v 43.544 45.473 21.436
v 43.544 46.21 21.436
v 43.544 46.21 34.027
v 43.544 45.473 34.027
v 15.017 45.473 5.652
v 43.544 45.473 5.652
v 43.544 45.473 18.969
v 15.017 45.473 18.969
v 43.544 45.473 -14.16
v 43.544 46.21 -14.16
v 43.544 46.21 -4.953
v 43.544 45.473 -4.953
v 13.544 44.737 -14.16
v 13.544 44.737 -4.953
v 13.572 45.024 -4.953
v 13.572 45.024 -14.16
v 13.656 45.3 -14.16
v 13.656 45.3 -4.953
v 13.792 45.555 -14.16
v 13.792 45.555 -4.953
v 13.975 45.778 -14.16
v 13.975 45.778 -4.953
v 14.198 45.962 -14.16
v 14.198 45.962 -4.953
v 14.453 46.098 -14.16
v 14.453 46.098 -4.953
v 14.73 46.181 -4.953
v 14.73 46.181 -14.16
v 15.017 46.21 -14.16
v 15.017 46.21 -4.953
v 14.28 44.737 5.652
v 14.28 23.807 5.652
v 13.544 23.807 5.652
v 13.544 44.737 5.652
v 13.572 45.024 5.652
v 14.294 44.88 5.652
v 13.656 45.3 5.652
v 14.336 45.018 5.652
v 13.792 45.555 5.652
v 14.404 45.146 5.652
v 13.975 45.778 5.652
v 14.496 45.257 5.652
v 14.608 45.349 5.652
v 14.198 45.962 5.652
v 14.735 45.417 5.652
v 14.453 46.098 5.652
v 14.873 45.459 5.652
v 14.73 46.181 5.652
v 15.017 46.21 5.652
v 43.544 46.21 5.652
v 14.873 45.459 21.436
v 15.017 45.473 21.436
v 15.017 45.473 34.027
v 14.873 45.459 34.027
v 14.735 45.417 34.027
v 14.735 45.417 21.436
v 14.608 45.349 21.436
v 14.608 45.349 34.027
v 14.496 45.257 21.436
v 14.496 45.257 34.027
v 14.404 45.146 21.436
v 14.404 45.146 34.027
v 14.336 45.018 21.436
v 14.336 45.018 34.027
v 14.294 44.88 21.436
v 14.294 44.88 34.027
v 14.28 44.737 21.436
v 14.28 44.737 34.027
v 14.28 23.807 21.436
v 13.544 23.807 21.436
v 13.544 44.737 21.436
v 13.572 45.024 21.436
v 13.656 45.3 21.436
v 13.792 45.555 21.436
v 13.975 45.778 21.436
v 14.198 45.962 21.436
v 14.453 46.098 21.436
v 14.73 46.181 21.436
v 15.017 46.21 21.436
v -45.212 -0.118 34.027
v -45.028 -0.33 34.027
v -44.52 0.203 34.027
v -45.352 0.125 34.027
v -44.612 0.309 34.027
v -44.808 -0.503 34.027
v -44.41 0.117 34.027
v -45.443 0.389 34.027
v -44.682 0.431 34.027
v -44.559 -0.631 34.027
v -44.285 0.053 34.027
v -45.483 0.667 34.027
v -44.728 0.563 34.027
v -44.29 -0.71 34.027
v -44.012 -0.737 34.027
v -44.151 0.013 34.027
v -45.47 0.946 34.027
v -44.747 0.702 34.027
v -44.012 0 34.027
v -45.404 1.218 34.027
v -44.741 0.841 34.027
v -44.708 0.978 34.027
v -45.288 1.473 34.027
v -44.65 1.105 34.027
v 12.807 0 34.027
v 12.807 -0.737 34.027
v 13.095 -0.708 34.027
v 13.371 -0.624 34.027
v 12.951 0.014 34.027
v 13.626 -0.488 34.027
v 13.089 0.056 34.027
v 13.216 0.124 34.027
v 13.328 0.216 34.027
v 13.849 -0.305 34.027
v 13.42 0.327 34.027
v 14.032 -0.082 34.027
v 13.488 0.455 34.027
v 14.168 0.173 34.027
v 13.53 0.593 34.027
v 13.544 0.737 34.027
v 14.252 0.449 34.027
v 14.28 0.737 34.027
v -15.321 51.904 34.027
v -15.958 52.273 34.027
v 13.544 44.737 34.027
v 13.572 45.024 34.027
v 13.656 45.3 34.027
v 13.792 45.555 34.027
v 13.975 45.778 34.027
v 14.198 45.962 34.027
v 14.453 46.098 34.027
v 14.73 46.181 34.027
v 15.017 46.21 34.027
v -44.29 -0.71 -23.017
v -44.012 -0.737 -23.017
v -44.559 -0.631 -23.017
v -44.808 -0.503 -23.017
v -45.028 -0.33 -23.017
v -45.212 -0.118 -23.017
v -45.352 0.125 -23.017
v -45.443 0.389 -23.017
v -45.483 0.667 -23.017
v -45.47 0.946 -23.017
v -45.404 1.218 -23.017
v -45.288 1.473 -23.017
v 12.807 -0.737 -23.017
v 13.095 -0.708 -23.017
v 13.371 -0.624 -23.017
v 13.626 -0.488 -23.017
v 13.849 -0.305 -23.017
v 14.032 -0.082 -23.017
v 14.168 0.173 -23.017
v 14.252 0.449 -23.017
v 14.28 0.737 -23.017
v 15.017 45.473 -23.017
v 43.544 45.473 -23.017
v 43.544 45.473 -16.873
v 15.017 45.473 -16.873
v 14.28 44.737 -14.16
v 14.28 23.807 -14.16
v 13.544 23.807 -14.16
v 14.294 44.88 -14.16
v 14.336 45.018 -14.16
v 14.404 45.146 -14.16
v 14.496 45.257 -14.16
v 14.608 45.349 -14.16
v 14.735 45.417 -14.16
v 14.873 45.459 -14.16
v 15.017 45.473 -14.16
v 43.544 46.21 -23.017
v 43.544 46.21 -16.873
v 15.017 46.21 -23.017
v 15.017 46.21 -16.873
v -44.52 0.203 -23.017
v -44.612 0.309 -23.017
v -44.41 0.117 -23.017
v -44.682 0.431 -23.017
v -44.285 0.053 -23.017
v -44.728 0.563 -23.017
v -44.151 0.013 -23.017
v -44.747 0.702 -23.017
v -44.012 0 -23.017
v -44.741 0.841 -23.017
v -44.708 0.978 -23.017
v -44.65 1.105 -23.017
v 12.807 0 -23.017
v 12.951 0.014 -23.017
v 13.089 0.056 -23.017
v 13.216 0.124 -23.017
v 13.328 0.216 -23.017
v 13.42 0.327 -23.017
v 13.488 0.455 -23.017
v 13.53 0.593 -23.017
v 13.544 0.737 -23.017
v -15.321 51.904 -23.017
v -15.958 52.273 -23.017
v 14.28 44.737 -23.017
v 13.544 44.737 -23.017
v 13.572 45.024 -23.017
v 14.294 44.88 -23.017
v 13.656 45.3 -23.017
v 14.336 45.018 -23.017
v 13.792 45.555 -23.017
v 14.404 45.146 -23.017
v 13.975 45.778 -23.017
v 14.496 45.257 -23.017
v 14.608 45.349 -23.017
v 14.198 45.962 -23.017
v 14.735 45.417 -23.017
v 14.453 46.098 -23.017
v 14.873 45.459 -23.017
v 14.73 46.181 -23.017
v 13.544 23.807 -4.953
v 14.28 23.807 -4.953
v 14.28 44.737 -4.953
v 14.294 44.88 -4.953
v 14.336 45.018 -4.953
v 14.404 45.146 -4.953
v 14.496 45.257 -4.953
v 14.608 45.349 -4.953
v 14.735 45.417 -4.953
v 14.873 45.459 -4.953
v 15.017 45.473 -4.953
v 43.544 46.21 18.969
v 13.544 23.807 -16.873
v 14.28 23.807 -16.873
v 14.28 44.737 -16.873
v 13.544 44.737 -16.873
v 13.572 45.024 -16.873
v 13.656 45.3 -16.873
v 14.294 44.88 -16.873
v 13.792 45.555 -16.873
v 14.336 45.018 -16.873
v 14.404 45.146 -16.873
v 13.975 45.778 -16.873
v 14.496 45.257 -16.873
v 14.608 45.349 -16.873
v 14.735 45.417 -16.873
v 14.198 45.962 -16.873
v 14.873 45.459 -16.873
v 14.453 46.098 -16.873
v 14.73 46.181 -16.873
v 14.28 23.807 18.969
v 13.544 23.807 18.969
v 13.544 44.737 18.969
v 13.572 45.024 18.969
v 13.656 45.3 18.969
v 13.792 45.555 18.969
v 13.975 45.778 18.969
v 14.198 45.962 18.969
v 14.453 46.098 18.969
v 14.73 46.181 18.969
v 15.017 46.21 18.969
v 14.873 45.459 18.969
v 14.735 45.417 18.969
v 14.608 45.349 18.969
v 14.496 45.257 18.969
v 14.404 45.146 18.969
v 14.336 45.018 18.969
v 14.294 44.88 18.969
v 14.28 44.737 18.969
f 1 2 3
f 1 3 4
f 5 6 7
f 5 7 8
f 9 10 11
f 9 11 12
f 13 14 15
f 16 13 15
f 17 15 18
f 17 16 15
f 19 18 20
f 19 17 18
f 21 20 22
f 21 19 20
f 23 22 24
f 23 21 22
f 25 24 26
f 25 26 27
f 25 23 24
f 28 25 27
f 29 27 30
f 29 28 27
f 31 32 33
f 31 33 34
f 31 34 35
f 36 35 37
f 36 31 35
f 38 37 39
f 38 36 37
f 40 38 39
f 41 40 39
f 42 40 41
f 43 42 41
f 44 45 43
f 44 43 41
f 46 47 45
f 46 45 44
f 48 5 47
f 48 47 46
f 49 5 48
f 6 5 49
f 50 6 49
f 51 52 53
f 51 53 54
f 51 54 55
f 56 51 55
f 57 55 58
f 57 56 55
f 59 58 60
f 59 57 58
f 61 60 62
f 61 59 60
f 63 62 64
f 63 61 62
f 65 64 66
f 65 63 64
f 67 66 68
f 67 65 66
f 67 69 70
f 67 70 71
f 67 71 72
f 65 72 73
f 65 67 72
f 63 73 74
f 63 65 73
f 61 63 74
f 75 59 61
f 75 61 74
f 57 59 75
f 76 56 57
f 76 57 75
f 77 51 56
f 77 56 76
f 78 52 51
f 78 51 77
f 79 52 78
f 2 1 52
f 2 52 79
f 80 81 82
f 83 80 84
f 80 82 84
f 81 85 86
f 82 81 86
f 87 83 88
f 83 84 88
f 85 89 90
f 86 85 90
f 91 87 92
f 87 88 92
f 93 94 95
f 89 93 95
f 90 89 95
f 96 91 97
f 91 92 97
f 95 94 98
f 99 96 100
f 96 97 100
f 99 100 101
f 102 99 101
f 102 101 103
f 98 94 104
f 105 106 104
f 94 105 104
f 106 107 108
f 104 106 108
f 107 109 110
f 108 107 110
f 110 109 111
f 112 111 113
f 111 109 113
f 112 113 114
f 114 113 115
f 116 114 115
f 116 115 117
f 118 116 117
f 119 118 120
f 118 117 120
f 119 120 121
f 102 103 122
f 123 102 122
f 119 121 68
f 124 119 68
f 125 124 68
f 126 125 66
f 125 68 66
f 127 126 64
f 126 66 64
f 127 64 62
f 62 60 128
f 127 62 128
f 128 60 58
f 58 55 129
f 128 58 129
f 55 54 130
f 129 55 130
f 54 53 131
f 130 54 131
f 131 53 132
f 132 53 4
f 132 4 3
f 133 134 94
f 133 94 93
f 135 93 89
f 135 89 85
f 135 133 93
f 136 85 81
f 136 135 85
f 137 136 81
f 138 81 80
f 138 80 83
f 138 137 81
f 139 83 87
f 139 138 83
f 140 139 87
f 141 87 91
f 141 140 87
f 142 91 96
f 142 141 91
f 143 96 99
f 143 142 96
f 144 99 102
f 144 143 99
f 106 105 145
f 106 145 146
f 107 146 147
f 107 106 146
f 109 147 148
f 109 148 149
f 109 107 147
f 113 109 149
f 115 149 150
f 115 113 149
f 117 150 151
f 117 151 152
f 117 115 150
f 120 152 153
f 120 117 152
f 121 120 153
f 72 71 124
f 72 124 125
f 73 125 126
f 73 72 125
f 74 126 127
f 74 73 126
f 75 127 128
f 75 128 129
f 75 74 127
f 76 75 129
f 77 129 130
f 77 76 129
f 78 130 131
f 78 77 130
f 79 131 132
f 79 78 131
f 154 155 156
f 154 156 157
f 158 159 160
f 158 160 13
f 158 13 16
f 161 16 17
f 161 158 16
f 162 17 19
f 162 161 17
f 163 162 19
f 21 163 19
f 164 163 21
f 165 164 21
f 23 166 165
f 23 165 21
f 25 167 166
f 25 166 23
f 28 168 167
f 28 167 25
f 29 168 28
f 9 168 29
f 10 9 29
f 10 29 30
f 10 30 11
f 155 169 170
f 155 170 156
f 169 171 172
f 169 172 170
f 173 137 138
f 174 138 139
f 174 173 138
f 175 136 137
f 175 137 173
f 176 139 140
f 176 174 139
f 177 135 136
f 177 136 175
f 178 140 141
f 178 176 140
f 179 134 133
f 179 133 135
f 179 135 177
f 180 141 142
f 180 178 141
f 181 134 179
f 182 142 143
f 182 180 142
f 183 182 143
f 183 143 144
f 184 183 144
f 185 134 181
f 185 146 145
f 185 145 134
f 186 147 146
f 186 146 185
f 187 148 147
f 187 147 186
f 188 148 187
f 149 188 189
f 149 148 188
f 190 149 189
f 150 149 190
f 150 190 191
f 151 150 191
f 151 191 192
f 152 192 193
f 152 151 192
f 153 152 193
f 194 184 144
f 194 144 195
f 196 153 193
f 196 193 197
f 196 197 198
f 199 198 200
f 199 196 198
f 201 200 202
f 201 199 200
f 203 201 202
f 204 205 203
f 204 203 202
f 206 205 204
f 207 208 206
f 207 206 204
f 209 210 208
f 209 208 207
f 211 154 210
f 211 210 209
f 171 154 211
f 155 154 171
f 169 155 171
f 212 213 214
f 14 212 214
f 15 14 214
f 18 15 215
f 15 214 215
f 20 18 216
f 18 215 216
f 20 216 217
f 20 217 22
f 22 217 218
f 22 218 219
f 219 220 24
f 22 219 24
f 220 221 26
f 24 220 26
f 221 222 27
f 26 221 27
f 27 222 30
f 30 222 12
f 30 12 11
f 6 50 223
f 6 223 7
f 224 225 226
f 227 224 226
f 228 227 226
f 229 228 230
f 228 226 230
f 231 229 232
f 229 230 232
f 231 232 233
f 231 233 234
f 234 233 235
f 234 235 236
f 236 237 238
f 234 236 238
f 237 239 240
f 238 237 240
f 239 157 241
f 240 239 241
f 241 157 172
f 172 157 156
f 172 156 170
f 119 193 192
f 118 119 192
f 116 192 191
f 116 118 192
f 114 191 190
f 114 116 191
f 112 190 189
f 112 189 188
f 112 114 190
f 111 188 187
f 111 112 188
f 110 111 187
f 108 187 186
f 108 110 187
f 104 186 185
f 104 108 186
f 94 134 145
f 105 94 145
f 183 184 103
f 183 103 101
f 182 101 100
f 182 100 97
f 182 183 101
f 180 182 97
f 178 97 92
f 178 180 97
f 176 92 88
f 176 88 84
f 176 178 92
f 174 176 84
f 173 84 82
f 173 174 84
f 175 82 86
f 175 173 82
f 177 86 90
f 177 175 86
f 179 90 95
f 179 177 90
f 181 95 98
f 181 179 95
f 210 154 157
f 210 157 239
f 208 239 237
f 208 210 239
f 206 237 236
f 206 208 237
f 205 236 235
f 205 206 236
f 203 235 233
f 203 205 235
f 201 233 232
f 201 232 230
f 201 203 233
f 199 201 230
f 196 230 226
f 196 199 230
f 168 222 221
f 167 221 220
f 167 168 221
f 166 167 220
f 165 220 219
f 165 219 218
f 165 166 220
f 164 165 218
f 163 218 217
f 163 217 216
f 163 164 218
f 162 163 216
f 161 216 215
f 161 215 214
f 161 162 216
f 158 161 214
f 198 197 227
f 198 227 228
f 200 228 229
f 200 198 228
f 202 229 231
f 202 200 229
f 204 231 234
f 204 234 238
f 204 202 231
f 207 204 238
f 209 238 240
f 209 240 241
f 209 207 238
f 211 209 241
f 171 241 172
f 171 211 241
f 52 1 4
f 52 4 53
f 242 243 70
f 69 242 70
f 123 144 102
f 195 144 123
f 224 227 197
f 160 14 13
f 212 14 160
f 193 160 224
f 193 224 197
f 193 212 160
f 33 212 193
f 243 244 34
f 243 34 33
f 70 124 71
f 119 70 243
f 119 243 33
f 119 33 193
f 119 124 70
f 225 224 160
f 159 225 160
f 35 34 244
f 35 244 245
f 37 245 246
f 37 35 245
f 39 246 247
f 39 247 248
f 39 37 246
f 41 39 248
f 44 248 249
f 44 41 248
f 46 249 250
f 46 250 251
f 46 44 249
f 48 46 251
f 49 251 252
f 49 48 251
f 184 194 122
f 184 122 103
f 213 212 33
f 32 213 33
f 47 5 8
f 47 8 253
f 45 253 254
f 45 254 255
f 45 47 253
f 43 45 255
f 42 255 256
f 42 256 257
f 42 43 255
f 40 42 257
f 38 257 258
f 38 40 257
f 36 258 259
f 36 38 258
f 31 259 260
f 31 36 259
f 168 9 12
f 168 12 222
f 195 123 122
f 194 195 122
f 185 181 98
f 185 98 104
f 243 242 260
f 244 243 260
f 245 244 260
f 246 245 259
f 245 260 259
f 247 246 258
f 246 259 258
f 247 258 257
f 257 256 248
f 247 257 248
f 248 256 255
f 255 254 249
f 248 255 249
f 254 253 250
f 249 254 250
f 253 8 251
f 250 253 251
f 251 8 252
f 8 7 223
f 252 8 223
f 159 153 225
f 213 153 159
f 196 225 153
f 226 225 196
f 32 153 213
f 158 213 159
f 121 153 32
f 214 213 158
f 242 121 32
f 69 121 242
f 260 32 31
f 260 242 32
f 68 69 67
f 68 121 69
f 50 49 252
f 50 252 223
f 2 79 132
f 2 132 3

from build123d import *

# Parameters (mm, degrees)
SKETCH1_W                      = 58.831256187
SKETCH1_H                      = 57.04415391
BASE_FLANGE1_DEPTH             = 0.7366
EDGE_FLANGE1_STRIP_W           = 4.4196
EDGE_FLANGE1_STRIP_H           = 0.7366
EDGE_FLANGE1_STRIP_CUT_DEPTH   = 57.044153909
EDGE_FLANGE1_DEPTH             = 57.044153909
SKETCH7_W                      = 2.712818276
SKETCH7_H                      = 25.730670316
SKETCH7_W_2                    = 10.604653262
SKETCH7_H_2                    = 26.641488396
SKETCH7_W_3                    = 2.466198433
SKETCH7_H_3                    = 28.772283842
CUT_EXTRUDE1_DEPTH             = 10
EDGE_FLANGE2_STRIP_CUT_DEPTH   = 57.044153909
EDGE_FLANGE2_DEPTH             = 57.044153909
EDGE_FLANGE3_STRIP_W           = 4.4196
EDGE_FLANGE3_STRIP_H           = 0.7366
EDGE_FLANGE3_STRIP_CUT_DEPTH   = 6.14423041
EDGE_FLANGE3_STRIP_2_W         = 4.4196
EDGE_FLANGE3_STRIP_2_H         = 0.7366
EDGE_FLANGE3_STRIP_CUT_2_DEPTH = 9.207140816
EDGE_FLANGE3_STRIP_3_W         = 4.4196
EDGE_FLANGE3_STRIP_3_H         = 0.7366
EDGE_FLANGE3_STRIP_CUT_3_DEPTH = 13.317471538
EDGE_FLANGE3_STRIP_4_W         = 4.4196
EDGE_FLANGE3_STRIP_4_H         = 0.7366
EDGE_FLANGE3_STRIP_CUT_4_DEPTH = 12.591641176
EDGE_FLANGE3_DEPTH             = 6.14423041
EDGE_FLANGE3_BEND_DEPTH        = 9.207140816
EDGE_FLANGE3_BEND_2_DEPTH      = 13.317471538
EDGE_FLANGE3_BEND_3_DEPTH      = 12.591641176


# Sheet-metal steps are written as plain solids
with BuildPart() as part:
    # Sketch1 → Base-Flange1 (new body)
    with BuildSketch(Plane(origin=(0, 0, 0), x_dir=(1, 0, 0), z_dir=(0, 1, 0))):
        with Locations((-15.871888874, -5.505069705)):
            Rectangle(SKETCH1_W, SKETCH1_H)
    extrude(amount=-BASE_FLANGE1_DEPTH)

    # Edge-Flange1 strip (across the edge) → Edge-Flange1 strip cut (cut)
    with BuildSketch(Plane(origin=(13.54373922, 0, 34.02714666), x_dir=(-1, 0, 0), z_dir=(0, 0, -1))):
        with Locations((-1.4732, -0.3683)):
            Rectangle(EDGE_FLANGE1_STRIP_W, EDGE_FLANGE1_STRIP_H)
    extrude(amount=EDGE_FLANGE1_STRIP_CUT_DEPTH, mode=Mode.SUBTRACT)

    # Edge-Flange1 section (across the edge) → Edge-Flange1 (add)
    with BuildSketch(Plane(origin=(13.54373922, 0, 34.02714666), x_dir=(-1, 0, 0), z_dir=(0, 0, -1))):
        with BuildLine():
            Line((-0.7366, 0.7366), (-0.7366, 45.4732))
            Line((-0.7366, 45.4732), (0, 45.4732))
            Line((0, 45.4732), (0, 0.7366))
            ThreePointArc((0, 0.7366), (0.215745145, 0.215745145), (0.7366, 0))
            Line((0.7366, 0), (0.7366, -0.7366))
            ThreePointArc((0.7366, -0.7366), (-0.30510971, -0.30510971), (-0.7366, 0.7366))
        make_face()
    extrude(amount=EDGE_FLANGE1_DEPTH)

    # Sketch7 → Cut-Extrude1 (cut)
    with BuildSketch(Plane.ZY.offset(-13.54373922)):
        with Locations((-15.516367702, 36.672250911)):
            Rectangle(SKETCH7_W, SKETCH7_H)
        with Locations((0.349508883, 37.127659951)):
            Rectangle(SKETCH7_W_2, SKETCH7_H_2)
        with Locations((20.202406268, 38.193057674)):
            Rectangle(SKETCH7_W_3, SKETCH7_H_3)
    extrude(amount=-CUT_EXTRUDE1_DEPTH, mode=Mode.SUBTRACT)

    # Edge-Flange2 strip (across the edge) → Edge-Flange2 strip cut (cut)
    with BuildSketch(Plane(origin=(-45.287516967, 0, -23.01700725), x_dir=(0.8660254037844398, -0.499999999999998, 0), z_dir=(0, 0, 1))):
        Polygon((-5.1562, -3.827485875), (1.4732, 0), (1.1049, 0.637914312), (-5.5245, -3.189571562), align=None)
    extrude(amount=EDGE_FLANGE2_STRIP_CUT_DEPTH, mode=Mode.SUBTRACT)

    # Edge-Flange2 section (across the edge) → Edge-Flange2 (add)
    with BuildSketch(Plane(origin=(-45.287516967, 0, -23.01700725), x_dir=(0.8660254037844398, -0.499999999999998, 0), z_dir=(0, 0, 1))):
        with BuildLine():
            Line((-0.7366, 1.275828625), (-0.7366, 59.933971375))
            Line((-0.7366, 59.933971375), (0, 59.933971375))
            Line((0, 59.933971375), (0, 1.275828625))
            ThreePointArc((0, 1.275828625), (0.3683, 0.637914312), (1.1049, 0.637914312))
            Line((1.1049, 0.637914312), (1.4732, 0))
            ThreePointArc((1.4732, 0), (0, 0), (-0.7366, 1.275828625))
        make_face()
    extrude(amount=EDGE_FLANGE2_DEPTH)

    # Edge-Flange3 strip (across the edge) → Edge-Flange3 strip cut (cut)
    with BuildSketch(Plane(origin=(14.28033922, 45.4732, -23.01700725), x_dir=(0, -1, 0), z_dir=(0, 0, 1))):
        with Locations((-1.4732, -0.3683)):
            Rectangle(EDGE_FLANGE3_STRIP_W, EDGE_FLANGE3_STRIP_H)
    extrude(amount=EDGE_FLANGE3_STRIP_CUT_DEPTH, mode=Mode.SUBTRACT)

    # Edge-Flange3 strip 2 (across the edge) → Edge-Flange3 strip cut 2 (cut)
    with BuildSketch(Plane(origin=(14.28033922, 45.4732, -14.159958564), x_dir=(0, -1, 0), z_dir=(0, 0, 1))):
        with Locations((-1.4732, -0.3683)):
            Rectangle(EDGE_FLANGE3_STRIP_2_W, EDGE_FLANGE3_STRIP_2_H)
    extrude(amount=EDGE_FLANGE3_STRIP_CUT_2_DEPTH, mode=Mode.SUBTRACT)

    # Edge-Flange3 strip 3 (across the edge) → Edge-Flange3 strip cut 3 (cut)
    with BuildSketch(Plane(origin=(14.28033922, 45.4732, 5.651835514), x_dir=(0, -1, 0), z_dir=(0, 0, 1))):
        with Locations((-1.4732, -0.3683)):
            Rectangle(EDGE_FLANGE3_STRIP_3_W, EDGE_FLANGE3_STRIP_3_H)
    extrude(amount=EDGE_FLANGE3_STRIP_CUT_3_DEPTH, mode=Mode.SUBTRACT)

    # Edge-Flange3 strip 4 (across the edge) → Edge-Flange3 strip cut 4 (cut)
    with BuildSketch(Plane(origin=(14.28033922, 45.4732, 21.435505484), x_dir=(0, -1, 0), z_dir=(0, 0, 1))):
        with Locations((-1.4732, -0.3683)):
            Rectangle(EDGE_FLANGE3_STRIP_4_W, EDGE_FLANGE3_STRIP_4_H)
    extrude(amount=EDGE_FLANGE3_STRIP_CUT_4_DEPTH, mode=Mode.SUBTRACT)

    # Edge-Flange3 section (across the edge) → Edge-Flange3 (add)
    with BuildSketch(Plane(origin=(14.28033922, 45.4732, -23.01700725), x_dir=(0, -1, 0), z_dir=(0, 0, 1))):
        with BuildLine():
            Line((-0.7366, 0.7366), (-0.7366, 29.2634))
            Line((-0.7366, 29.2634), (0, 29.2634))
            Line((0, 29.2634), (0, 0.7366))
            ThreePointArc((0, 0.7366), (0.215745145, 0.215745145), (0.7366, 0))
            Line((0.7366, 0), (0.7366, -0.7366))
            ThreePointArc((0.7366, -0.7366), (-0.30510971, -0.30510971), (-0.7366, 0.7366))
        make_face()
    extrude(amount=EDGE_FLANGE3_DEPTH)

    # Edge-Flange3 section 2 (across the edge) → Edge-Flange3 bend (add)
    with BuildSketch(Plane(origin=(14.28033922, 45.4732, -14.159958564), x_dir=(0, -1, 0), z_dir=(0, 0, 1))):
        with BuildLine():
            Line((-0.7366, 0.7366), (-0.7366, 29.2634))
            Line((-0.7366, 29.2634), (0, 29.2634))
            Line((0, 29.2634), (0, 0.7366))
            ThreePointArc((0, 0.7366), (0.215745145, 0.215745145), (0.7366, 0))
            Line((0.7366, 0), (0.7366, -0.7366))
            ThreePointArc((0.7366, -0.7366), (-0.30510971, -0.30510971), (-0.7366, 0.7366))
        make_face()
    extrude(amount=EDGE_FLANGE3_BEND_DEPTH)

    # Edge-Flange3 section 3 (across the edge) → Edge-Flange3 bend 2 (add)
    with BuildSketch(Plane(origin=(14.28033922, 45.4732, 5.651835514), x_dir=(0, -1, 0), z_dir=(0, 0, 1))):
        with BuildLine():
            Line((-0.7366, 0.7366), (-0.7366, 29.2634))
            Line((-0.7366, 29.2634), (0, 29.2634))
            Line((0, 29.2634), (0, 0.7366))
            ThreePointArc((0, 0.7366), (0.215745145, 0.215745145), (0.7366, 0))
            Line((0.7366, 0), (0.7366, -0.7366))
            ThreePointArc((0.7366, -0.7366), (-0.30510971, -0.30510971), (-0.7366, 0.7366))
        make_face()
    extrude(amount=EDGE_FLANGE3_BEND_2_DEPTH)

    # Edge-Flange3 section 4 (across the edge) → Edge-Flange3 bend 3 (add)
    with BuildSketch(Plane(origin=(14.28033922, 45.4732, 21.435505484), x_dir=(0, -1, 0), z_dir=(0, 0, 1))):
        with BuildLine():
            Line((-0.7366, 0.7366), (-0.7366, 29.2634))
            Line((-0.7366, 29.2634), (0, 29.2634))
            Line((0, 29.2634), (0, 0.7366))
            ThreePointArc((0, 0.7366), (0.215745145, 0.215745145), (0.7366, 0))
            Line((0.7366, 0), (0.7366, -0.7366))
            ThreePointArc((0.7366, -0.7366), (-0.30510971, -0.30510971), (-0.7366, 0.7366))
        make_face()
    extrude(amount=EDGE_FLANGE3_BEND_3_DEPTH)


solid = part.part
